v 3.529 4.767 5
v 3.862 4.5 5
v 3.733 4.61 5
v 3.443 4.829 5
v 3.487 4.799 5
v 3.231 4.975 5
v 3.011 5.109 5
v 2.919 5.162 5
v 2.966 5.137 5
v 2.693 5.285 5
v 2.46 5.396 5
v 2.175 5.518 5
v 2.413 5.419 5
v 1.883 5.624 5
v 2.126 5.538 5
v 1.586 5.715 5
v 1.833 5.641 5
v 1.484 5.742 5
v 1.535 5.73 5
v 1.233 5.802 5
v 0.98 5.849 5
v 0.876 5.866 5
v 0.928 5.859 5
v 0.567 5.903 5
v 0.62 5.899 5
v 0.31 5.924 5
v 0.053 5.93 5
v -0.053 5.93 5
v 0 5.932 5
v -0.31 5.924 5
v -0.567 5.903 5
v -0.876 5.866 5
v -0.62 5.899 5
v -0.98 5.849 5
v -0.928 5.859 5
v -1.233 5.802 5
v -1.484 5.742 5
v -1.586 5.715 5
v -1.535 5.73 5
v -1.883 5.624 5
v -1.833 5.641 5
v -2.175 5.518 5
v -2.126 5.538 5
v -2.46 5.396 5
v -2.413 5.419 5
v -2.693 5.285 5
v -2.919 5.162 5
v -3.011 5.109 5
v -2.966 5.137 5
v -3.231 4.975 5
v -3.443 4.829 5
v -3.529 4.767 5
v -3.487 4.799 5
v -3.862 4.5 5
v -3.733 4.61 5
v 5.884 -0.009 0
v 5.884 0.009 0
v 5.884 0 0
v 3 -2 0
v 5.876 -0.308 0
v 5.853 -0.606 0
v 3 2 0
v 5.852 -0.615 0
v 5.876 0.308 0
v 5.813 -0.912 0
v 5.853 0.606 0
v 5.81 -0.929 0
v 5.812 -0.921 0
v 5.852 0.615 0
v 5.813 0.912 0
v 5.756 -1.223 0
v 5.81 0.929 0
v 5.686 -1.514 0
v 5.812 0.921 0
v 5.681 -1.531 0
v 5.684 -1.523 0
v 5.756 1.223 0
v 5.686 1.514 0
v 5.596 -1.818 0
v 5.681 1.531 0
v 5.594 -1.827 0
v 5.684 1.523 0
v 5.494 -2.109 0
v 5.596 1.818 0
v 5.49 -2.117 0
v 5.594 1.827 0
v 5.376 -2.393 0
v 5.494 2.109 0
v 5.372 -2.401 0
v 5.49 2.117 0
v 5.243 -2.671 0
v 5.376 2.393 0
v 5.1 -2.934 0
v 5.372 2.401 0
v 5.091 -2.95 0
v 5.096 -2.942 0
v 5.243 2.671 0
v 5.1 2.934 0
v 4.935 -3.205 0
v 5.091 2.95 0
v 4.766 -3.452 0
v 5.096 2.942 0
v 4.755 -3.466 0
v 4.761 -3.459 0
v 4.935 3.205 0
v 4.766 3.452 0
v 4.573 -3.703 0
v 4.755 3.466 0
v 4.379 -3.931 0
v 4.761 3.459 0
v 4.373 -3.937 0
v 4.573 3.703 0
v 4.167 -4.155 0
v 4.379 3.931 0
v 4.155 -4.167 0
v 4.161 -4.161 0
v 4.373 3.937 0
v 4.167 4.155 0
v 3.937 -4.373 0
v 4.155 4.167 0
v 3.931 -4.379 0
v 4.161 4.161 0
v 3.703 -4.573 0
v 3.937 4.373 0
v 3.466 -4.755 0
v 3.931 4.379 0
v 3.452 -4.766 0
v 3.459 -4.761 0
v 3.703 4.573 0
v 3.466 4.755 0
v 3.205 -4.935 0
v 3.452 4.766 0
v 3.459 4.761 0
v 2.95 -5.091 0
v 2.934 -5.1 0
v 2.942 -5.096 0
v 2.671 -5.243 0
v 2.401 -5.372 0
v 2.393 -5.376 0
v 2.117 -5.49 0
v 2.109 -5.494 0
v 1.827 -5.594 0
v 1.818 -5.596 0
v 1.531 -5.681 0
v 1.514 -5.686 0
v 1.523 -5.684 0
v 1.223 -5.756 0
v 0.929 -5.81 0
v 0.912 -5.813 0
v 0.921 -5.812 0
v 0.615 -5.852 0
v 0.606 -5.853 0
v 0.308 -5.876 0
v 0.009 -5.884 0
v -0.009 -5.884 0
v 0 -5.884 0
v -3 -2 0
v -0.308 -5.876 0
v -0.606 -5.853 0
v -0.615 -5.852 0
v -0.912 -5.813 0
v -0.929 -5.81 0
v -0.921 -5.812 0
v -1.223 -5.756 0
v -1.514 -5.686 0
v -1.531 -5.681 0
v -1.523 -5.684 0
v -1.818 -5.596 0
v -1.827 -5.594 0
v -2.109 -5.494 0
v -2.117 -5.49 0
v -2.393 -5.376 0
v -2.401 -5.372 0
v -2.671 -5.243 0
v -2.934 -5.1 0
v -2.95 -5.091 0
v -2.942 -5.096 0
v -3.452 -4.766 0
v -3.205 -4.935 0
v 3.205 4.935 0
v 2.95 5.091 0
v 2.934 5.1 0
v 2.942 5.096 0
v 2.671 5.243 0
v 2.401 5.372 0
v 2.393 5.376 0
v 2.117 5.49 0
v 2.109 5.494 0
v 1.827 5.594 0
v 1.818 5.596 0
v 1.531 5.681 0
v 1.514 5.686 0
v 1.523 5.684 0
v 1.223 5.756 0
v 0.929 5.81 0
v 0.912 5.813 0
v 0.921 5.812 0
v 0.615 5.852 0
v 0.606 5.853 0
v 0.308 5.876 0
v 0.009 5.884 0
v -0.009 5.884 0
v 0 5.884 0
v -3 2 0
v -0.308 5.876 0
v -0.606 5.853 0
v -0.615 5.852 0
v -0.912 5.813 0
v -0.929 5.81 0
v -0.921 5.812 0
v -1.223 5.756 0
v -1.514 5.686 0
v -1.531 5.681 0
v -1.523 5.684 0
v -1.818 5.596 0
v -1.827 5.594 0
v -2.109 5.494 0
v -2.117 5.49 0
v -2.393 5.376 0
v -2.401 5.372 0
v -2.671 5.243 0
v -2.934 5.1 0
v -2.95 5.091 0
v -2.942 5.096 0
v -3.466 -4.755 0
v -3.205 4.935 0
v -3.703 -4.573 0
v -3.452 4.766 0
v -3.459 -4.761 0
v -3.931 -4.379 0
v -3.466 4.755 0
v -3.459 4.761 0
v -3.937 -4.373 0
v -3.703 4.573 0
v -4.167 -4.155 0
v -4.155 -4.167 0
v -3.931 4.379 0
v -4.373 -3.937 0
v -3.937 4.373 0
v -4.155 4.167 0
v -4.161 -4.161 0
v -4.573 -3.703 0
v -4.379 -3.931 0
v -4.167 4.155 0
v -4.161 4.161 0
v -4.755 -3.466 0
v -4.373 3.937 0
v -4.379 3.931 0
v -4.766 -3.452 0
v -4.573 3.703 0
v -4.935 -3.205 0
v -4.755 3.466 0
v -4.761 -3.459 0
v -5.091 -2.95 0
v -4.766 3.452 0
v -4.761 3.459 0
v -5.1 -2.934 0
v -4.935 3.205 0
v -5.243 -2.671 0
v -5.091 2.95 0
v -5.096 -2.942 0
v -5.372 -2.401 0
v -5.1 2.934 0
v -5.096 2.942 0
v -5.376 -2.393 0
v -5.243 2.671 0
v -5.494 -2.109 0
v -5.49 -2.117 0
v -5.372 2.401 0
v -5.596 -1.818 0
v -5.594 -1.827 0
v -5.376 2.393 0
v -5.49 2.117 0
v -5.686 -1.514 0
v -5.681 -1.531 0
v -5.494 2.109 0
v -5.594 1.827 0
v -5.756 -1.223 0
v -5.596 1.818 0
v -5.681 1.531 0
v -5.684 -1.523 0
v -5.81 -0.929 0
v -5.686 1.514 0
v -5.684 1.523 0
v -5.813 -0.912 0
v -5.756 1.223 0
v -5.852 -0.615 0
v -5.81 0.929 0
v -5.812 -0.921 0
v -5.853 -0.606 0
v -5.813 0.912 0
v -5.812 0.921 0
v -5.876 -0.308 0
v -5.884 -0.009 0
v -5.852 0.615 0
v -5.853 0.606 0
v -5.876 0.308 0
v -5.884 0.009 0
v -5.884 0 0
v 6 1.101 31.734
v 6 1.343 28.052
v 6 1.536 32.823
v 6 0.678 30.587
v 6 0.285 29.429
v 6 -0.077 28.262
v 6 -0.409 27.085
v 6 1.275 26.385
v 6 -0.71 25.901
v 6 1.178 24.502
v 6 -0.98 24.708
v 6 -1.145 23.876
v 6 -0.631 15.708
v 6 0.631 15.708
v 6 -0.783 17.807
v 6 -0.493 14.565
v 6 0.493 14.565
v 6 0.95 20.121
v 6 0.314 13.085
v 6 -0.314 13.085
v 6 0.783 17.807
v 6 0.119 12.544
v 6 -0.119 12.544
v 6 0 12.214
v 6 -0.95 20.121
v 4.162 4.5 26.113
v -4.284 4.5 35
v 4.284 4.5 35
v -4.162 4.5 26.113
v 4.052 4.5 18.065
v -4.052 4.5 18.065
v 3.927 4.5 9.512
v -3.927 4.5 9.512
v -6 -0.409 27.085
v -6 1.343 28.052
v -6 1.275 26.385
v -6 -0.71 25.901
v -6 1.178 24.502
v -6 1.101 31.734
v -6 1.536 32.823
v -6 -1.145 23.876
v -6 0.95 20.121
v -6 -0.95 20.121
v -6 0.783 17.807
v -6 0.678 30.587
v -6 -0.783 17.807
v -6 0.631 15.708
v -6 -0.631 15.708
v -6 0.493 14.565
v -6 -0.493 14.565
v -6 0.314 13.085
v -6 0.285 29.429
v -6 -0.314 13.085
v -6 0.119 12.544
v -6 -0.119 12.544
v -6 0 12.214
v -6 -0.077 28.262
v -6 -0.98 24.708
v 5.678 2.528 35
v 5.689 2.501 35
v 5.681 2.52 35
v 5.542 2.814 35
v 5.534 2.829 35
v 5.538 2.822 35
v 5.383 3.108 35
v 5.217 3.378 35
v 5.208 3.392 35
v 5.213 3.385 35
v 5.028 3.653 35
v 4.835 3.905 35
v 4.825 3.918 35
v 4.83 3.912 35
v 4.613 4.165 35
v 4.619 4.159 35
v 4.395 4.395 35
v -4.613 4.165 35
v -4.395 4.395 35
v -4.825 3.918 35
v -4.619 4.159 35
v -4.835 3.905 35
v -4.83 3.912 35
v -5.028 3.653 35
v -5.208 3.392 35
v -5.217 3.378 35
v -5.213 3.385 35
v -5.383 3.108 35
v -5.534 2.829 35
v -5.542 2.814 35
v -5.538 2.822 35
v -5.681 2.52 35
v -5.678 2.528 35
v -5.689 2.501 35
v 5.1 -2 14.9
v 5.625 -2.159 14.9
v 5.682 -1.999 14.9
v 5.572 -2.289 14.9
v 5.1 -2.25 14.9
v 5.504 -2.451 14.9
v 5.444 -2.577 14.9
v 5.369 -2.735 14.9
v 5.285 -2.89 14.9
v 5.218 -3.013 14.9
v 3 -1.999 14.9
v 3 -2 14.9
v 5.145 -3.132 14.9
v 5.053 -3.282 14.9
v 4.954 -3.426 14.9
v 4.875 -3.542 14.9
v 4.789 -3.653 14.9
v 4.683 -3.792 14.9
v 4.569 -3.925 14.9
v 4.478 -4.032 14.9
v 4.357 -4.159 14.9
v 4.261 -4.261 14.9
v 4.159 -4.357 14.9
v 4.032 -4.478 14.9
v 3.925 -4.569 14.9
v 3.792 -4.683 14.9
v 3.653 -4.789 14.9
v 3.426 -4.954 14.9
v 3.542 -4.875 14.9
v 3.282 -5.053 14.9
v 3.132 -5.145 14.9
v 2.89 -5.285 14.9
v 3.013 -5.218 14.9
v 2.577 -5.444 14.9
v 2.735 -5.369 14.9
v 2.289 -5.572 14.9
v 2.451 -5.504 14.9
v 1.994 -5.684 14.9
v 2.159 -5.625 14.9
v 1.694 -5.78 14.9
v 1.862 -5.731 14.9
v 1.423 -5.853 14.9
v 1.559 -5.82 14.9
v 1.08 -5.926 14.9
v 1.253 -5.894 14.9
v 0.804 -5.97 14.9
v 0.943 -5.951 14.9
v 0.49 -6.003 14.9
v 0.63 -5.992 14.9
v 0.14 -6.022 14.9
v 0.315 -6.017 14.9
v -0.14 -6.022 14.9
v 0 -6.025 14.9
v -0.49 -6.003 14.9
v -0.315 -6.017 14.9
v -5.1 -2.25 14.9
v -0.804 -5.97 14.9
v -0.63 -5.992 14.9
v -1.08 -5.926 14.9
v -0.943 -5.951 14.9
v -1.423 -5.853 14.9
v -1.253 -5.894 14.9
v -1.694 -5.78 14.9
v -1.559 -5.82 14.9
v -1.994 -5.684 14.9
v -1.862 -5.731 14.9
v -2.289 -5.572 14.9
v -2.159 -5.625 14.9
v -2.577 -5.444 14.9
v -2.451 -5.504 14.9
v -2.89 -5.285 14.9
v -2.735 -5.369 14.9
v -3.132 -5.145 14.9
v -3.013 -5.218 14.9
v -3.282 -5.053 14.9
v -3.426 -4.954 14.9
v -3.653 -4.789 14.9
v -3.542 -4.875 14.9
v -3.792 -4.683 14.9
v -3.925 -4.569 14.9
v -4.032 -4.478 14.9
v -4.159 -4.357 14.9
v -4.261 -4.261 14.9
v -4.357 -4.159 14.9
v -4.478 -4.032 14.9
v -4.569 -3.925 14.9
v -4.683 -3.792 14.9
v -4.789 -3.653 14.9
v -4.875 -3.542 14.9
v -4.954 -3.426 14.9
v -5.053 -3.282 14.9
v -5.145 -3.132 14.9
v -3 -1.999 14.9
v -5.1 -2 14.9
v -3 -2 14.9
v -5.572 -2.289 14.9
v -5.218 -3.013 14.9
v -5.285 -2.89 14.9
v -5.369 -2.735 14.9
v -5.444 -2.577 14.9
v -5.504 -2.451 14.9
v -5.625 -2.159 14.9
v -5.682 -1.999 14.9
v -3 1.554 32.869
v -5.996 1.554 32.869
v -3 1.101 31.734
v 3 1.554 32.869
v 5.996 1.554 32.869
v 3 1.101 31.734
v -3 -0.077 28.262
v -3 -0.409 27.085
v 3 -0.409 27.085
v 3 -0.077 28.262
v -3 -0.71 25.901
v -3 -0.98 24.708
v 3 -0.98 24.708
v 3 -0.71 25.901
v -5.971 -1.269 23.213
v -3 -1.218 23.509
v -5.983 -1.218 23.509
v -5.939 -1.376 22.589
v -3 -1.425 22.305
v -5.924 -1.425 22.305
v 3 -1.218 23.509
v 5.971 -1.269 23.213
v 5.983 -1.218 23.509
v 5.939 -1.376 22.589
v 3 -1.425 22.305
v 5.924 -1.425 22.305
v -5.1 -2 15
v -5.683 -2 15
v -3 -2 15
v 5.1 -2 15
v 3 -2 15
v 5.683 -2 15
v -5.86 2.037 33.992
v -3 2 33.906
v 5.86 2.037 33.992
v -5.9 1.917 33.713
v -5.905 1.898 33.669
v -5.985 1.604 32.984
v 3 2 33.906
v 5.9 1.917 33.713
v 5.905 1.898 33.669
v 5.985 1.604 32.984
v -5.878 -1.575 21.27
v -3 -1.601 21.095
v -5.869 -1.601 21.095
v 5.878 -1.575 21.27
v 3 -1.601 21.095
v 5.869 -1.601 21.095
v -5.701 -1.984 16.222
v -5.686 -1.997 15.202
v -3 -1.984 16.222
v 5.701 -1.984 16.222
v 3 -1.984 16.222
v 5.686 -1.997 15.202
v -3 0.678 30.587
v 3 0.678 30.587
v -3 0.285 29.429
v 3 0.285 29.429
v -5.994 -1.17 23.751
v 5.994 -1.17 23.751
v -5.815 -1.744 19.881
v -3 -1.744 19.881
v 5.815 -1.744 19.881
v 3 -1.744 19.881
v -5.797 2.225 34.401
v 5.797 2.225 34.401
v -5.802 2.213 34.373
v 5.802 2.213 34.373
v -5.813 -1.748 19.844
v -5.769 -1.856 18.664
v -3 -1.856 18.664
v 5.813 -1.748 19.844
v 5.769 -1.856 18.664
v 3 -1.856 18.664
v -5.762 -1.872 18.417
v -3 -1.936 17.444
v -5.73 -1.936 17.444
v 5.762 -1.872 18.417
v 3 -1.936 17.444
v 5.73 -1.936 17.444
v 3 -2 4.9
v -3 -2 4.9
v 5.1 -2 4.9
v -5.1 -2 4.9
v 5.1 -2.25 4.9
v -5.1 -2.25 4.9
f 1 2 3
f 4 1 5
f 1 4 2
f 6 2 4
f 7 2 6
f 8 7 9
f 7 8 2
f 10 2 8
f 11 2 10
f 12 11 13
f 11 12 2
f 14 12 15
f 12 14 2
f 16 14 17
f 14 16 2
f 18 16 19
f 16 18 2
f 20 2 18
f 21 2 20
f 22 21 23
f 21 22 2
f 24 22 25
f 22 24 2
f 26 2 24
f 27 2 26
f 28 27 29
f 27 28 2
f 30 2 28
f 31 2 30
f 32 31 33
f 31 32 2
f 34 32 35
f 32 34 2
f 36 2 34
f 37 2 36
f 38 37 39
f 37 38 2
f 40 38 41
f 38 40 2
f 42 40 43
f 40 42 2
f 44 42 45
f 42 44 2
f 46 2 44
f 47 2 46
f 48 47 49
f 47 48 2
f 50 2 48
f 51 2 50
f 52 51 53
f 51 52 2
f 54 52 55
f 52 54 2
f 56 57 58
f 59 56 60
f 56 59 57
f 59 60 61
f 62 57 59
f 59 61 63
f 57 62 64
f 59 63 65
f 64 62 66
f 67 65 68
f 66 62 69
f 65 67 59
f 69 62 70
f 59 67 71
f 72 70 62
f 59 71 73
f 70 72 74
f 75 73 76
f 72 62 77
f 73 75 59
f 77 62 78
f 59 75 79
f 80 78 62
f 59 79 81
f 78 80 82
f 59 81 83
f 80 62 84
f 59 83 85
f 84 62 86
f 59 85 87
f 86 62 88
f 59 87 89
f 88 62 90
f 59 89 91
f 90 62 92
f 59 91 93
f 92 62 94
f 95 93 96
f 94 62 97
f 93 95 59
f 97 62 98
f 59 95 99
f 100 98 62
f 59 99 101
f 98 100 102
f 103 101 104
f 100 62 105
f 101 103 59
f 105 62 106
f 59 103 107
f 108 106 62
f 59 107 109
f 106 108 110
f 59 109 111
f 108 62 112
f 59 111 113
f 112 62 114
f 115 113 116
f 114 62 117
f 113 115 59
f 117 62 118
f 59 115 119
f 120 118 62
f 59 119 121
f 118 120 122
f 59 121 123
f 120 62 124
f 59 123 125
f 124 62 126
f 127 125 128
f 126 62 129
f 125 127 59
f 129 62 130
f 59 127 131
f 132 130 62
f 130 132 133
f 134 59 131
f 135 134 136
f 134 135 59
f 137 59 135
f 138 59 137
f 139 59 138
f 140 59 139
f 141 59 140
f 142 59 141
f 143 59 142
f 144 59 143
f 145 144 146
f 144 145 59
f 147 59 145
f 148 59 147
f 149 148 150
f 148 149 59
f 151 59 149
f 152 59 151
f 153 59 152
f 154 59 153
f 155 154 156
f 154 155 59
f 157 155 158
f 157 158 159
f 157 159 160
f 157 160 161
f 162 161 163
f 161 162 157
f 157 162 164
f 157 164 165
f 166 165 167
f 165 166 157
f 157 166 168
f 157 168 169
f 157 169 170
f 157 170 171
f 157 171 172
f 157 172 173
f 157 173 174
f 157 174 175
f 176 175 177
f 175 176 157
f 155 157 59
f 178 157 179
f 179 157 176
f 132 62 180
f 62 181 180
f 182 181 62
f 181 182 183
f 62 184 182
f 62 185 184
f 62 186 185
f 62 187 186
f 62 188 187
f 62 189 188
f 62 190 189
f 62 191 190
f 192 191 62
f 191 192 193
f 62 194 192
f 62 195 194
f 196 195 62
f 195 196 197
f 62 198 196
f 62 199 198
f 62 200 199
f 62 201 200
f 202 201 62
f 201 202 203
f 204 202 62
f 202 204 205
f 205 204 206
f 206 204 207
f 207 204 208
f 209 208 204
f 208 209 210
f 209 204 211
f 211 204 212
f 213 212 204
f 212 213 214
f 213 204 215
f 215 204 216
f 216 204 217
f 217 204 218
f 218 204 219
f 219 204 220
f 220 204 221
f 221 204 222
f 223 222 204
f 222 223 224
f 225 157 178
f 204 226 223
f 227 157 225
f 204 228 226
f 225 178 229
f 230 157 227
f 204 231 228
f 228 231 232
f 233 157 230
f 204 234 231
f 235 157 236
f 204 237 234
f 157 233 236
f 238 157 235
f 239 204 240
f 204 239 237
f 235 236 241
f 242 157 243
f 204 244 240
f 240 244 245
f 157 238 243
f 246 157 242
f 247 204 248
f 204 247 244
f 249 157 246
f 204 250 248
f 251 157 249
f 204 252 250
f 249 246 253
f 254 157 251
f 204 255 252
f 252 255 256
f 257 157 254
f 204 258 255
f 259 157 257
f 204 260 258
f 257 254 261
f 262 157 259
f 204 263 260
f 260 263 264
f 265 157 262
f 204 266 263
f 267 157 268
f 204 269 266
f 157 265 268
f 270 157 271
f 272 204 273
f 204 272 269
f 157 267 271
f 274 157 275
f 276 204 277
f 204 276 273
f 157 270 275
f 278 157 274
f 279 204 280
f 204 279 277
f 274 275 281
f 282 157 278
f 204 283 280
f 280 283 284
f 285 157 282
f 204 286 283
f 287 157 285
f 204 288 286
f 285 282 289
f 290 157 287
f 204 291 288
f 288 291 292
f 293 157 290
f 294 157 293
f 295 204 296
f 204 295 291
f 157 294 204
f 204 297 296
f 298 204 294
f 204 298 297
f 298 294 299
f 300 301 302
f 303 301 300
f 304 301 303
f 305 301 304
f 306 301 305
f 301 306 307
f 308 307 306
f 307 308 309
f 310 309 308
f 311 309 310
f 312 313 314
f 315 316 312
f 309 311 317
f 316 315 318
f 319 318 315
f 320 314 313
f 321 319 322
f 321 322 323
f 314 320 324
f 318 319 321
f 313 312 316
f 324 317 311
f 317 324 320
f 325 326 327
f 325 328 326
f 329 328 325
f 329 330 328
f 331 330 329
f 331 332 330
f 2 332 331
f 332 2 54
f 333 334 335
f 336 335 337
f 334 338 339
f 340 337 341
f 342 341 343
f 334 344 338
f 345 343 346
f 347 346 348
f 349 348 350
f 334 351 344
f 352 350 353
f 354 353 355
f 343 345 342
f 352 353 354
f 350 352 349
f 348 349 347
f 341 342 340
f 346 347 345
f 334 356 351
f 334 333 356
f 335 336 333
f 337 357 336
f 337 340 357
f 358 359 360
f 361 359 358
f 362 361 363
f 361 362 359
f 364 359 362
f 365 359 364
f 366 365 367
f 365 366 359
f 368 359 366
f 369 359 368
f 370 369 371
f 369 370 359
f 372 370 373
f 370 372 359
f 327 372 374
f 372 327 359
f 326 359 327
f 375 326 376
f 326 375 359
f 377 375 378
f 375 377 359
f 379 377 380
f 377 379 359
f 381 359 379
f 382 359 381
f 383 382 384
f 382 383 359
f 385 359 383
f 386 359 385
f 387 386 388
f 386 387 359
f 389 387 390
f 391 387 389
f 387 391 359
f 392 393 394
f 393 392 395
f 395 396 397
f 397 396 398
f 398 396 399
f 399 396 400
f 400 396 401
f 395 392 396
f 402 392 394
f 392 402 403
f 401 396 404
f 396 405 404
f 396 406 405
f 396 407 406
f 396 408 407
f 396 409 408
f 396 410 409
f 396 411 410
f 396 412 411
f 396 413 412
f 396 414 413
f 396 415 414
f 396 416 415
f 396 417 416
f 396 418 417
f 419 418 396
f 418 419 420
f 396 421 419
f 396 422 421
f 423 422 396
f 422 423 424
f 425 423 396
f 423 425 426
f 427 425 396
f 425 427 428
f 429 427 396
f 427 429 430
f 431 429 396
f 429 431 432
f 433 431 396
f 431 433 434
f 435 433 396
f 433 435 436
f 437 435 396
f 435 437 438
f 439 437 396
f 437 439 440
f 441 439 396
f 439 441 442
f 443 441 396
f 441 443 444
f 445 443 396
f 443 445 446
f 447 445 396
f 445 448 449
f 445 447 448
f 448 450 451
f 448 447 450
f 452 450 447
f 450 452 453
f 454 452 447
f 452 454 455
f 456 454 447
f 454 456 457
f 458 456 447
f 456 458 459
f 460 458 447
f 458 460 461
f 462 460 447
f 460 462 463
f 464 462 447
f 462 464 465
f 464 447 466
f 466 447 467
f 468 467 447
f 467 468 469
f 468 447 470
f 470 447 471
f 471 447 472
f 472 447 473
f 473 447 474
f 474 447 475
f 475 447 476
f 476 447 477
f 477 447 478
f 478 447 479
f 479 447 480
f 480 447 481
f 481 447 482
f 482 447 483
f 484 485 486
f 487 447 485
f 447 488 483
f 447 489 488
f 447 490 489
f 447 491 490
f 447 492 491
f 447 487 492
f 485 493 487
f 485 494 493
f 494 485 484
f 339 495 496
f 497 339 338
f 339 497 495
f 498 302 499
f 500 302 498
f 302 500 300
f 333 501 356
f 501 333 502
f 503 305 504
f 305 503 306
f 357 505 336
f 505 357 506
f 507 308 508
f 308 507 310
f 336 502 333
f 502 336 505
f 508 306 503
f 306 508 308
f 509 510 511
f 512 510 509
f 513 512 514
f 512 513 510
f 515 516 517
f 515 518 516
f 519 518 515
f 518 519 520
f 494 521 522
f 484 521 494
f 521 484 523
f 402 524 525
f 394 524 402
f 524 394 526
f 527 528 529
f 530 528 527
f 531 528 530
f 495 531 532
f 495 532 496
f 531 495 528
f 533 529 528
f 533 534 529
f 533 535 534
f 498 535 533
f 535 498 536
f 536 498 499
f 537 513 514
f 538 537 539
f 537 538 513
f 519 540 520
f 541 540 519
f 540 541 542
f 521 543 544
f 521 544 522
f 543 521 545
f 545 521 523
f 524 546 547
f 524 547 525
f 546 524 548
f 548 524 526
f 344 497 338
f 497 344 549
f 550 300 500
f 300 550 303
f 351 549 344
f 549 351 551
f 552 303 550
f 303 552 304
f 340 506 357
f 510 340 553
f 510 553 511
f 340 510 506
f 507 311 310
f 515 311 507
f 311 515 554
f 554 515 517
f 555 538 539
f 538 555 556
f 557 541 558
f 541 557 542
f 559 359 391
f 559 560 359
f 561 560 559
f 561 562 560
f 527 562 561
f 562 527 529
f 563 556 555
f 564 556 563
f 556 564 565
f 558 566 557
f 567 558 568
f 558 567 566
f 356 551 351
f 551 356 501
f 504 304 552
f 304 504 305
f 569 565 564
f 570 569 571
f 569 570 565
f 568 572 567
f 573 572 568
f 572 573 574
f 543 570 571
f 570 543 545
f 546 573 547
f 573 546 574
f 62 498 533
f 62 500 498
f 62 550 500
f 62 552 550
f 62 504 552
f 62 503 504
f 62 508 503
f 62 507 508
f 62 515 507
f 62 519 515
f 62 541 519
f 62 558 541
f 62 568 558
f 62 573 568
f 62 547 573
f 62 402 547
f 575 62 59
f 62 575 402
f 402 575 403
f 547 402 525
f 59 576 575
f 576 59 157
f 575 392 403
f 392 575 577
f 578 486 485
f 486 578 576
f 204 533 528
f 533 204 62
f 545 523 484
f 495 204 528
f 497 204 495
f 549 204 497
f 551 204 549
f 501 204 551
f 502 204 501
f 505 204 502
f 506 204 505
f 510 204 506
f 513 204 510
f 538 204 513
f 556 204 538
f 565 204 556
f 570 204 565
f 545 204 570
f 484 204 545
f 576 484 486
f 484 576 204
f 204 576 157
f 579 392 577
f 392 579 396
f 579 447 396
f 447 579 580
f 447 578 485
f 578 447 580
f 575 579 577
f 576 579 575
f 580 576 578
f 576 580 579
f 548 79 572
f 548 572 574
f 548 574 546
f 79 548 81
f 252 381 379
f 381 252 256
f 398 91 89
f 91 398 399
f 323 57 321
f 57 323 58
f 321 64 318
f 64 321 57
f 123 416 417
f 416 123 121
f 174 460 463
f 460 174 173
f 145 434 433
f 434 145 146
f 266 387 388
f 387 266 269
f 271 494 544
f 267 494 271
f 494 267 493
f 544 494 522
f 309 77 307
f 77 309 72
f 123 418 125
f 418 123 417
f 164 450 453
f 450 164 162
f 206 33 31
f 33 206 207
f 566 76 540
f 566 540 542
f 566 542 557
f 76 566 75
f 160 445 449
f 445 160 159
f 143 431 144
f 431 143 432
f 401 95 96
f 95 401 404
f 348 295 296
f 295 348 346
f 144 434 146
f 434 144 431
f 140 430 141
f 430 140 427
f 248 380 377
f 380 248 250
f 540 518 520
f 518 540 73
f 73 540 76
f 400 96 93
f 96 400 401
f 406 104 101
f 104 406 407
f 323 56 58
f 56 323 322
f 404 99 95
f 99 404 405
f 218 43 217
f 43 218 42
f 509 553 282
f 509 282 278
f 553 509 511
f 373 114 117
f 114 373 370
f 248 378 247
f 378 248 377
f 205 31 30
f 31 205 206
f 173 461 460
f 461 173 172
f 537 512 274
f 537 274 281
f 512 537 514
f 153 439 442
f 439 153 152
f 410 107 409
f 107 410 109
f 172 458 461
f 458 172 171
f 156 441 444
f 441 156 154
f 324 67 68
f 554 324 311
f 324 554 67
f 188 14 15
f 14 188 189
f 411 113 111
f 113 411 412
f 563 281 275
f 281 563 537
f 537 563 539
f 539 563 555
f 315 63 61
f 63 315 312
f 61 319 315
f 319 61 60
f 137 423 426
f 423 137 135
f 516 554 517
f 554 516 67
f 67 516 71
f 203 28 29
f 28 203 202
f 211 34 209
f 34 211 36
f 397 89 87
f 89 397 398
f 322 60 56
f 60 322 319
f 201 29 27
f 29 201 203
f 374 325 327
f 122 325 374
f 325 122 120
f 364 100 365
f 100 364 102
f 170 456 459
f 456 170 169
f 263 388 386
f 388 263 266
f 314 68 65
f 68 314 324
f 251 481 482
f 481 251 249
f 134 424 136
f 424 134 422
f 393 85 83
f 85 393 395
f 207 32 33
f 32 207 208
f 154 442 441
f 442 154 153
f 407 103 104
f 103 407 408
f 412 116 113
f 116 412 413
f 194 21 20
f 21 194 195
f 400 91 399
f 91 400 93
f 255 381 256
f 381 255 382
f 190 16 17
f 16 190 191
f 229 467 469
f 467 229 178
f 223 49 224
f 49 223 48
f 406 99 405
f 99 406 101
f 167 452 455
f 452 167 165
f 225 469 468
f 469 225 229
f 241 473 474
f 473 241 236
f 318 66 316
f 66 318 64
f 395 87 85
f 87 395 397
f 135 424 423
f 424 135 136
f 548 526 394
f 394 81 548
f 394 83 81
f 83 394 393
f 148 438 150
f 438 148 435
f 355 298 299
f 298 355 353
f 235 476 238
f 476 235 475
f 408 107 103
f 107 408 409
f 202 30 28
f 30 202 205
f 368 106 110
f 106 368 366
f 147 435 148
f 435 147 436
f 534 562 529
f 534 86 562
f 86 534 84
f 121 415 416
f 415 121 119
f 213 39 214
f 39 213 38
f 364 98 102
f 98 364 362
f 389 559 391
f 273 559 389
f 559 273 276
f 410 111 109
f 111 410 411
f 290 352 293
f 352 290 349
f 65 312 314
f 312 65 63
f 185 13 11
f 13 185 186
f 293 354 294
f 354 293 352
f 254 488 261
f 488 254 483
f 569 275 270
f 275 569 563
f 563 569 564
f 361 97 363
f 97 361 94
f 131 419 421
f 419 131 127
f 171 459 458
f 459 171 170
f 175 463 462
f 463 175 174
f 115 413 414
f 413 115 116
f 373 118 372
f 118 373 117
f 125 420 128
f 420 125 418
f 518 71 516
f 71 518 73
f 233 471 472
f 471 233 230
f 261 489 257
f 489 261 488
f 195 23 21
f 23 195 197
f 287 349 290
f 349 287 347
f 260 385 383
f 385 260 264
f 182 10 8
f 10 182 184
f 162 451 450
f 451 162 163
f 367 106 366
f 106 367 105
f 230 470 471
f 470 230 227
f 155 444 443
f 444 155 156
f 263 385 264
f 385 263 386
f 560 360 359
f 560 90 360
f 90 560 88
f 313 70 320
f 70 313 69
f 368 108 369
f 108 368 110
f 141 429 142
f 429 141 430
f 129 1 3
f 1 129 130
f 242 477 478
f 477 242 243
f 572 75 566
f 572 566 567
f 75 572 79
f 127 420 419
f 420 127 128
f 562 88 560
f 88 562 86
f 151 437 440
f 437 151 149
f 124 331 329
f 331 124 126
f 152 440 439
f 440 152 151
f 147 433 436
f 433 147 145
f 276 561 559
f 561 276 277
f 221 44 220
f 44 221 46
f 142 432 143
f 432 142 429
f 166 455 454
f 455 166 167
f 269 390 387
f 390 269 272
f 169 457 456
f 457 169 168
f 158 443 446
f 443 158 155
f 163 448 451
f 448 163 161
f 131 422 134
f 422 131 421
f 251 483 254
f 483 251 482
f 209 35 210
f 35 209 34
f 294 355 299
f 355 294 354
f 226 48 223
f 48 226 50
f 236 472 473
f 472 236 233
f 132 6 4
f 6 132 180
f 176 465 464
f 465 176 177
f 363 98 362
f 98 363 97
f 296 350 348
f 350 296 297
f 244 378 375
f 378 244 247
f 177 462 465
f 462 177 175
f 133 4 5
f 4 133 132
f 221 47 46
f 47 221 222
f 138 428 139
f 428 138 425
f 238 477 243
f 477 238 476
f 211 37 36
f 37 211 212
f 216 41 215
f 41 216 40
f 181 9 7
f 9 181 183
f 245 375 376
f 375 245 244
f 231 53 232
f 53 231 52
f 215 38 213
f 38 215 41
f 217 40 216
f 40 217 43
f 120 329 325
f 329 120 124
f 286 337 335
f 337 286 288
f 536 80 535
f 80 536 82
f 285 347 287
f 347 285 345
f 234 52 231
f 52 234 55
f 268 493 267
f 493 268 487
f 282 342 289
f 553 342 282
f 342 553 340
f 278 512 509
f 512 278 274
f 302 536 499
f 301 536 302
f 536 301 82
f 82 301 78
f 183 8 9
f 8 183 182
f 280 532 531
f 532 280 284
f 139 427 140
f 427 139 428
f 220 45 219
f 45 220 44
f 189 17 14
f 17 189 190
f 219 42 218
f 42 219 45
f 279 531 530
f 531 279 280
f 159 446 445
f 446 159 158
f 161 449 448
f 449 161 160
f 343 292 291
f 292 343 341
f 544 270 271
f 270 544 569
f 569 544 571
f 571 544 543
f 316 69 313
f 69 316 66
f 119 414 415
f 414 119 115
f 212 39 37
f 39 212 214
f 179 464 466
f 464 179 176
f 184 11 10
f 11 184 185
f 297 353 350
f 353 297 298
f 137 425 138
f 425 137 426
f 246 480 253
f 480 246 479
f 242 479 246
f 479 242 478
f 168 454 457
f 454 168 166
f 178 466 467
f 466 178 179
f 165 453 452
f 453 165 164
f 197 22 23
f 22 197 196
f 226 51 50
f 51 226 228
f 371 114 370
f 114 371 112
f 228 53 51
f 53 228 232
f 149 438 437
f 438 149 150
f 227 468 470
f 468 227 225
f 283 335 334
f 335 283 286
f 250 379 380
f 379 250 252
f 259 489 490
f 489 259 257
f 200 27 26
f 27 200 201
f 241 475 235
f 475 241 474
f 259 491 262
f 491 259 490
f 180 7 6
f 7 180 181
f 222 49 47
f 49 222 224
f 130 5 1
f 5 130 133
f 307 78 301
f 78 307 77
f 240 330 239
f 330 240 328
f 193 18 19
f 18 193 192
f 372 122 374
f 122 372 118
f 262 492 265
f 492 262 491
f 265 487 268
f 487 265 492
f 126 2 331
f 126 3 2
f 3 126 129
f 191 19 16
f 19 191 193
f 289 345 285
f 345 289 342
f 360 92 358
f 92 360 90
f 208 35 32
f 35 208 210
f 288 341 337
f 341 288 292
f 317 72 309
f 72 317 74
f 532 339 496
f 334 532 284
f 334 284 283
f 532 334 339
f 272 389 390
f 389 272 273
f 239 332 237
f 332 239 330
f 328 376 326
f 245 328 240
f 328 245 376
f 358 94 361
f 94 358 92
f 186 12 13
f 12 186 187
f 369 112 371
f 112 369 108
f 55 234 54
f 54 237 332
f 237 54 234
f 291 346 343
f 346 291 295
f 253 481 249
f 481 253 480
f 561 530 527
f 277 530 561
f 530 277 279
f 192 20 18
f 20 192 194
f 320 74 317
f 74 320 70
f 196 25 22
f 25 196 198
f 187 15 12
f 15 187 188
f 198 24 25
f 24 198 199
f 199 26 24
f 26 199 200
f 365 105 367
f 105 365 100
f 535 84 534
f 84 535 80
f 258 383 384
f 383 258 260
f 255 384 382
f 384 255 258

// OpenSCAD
// --- 3Dプリント用 リード式音源 リード固定部分 ---

// ★出力するリードの厚みを選択してください（0.1 / 0.2 / 0.3）
reed_thickness = 0.2; 

// 出力の向き
//   true  : 印刷用の姿勢（縦置き・サポート材不要）★デフォルト★
//           ストッパー側の平らな面がベッドに接地し、そのまま印刷できます。
//   false : 寝かせた姿勢（内部構造やスリットをプレビューで確認したいとき）
print_ready_orientation = true;

// === 3Dプリント寸法・嵌合調整パラメーター ===
clearance = 0.25;       // カプセルにはまる時のクリアランス（きつい場合は増やす）

slot_vertical_clearance = 0.05; 

fixed_length = 10.0;    // リードを固定する「屋根」の長さ

// [受け側カプセルの設計値（ここからテーパー角を自動計算します）]
reed_chamber_length = 40.0;
reed_insert_dia_top = 12.8;
reed_insert_dia_bottom = 12.0;

// [台座の基本寸法]
cylinder_depth = 5.0;   
base_w = 12.0;          
base_l = 30.0;          
base_h = 6.5;           

// [音道穴・位置の計算]
hole_w = 6.0;           
hole_h = 4.0;           
hole_bottom_z = -2.0;   
base_top_z = hole_bottom_z + hole_h; // Z=2.0
base_bottom_z = base_top_z - base_h; // Z=-4.5

// 先端の厚み（2.0mm）
taper_end_h = 2.0;      
reed_w = 10.0;          

// === 物理特性に合わせたテーパー（円錐）の外径自動計算 ===
total_length = cylinder_depth + base_l; 
d1_final = reed_insert_dia_bottom - clearance; 
d2_final = (reed_insert_dia_bottom + (reed_insert_dia_top - reed_insert_dia_bottom) * total_length / reed_chamber_length) - clearance; 

// スリットの最終的な高さを計算
actual_slot_h = reed_thickness + slot_vertical_clearance;

$fn = 120; // 曲面の滑らかさ

// --- モジュール定義 ---
module reed_base_part() {
    intersection() {
        // 全体を包み込むテーパー円柱
        translate([0, -1, 0])
            rotate([-90, 0, 0])
                cylinder(h=total_length + 2, d1=d1_final, d2=d2_final);

        difference() {
            union() {
                // 1. 円柱部分（ストッパー）
                translate([0, cylinder_depth, 0])
                    rotate([90, 0, 0])
                        cylinder(h=cylinder_depth, d=15.0); 
                
                // 2. 台座ブロック（屋根を含む）
                translate([-base_w/2, cylinder_depth, base_bottom_z])
                    cube([base_w, base_l, base_h + 5]);
            }
            
            // --- くり抜き・カット ---
            
            // A. 屋根の下の「完全なトンネル」
            translate([-hole_w/2, -0.1, hole_bottom_z])
                cube([hole_w, cylinder_depth + fixed_length + 0.1, hole_h]);
                
            // B. リード下の「U字溝」
            translate([-hole_w/2, cylinder_depth + fixed_length - 0.1, hole_bottom_z])
                cube([hole_w, base_l - fixed_length + 0.2, 10]);

            // C. リードを差し込む「スリット」
            translate([-(reed_w + 0.2)/2, cylinder_depth - 0.1, base_top_z])
                cube([reed_w + 0.2, fixed_length + 0.2, actual_slot_h]);

            // D. 先端のカーブカット（フェイシングカーブ）
            _L1 = cylinder_depth + fixed_length;
            _Z1 = base_top_z;
            _L2 = cylinder_depth + base_l;
            _Z2 = base_bottom_z + taper_end_h; 
            
            _R = (pow(_L2 - _L1, 2) + pow(_Z2 - _Z1, 2)) / (2 * (_Z1 - _Z2));
            _Cy = _L1;
            _Cz = _Z1 - _R;

            _cut_width = base_w + 2;
            _cut_length = _L2 - _L1 + 2;
            _cut_height = 20;

            difference() {
                translate([-_cut_width/2, _L1 - 0.1, _Z2 - 5])
                    cube([_cut_width, _cut_length, _cut_height]);

                translate([0, _Cy, _Cz])
                    rotate([0, 90, 0])
                        cylinder(h=_cut_width + 2, r=_R, center=true, $fn=240);
            }
        }
    }
}

// --- 描画処理 ---
if (print_ready_orientation) {
    rotate([90, 0, 0])
        reed_base_part();
} else {
    reed_base_part();
}
